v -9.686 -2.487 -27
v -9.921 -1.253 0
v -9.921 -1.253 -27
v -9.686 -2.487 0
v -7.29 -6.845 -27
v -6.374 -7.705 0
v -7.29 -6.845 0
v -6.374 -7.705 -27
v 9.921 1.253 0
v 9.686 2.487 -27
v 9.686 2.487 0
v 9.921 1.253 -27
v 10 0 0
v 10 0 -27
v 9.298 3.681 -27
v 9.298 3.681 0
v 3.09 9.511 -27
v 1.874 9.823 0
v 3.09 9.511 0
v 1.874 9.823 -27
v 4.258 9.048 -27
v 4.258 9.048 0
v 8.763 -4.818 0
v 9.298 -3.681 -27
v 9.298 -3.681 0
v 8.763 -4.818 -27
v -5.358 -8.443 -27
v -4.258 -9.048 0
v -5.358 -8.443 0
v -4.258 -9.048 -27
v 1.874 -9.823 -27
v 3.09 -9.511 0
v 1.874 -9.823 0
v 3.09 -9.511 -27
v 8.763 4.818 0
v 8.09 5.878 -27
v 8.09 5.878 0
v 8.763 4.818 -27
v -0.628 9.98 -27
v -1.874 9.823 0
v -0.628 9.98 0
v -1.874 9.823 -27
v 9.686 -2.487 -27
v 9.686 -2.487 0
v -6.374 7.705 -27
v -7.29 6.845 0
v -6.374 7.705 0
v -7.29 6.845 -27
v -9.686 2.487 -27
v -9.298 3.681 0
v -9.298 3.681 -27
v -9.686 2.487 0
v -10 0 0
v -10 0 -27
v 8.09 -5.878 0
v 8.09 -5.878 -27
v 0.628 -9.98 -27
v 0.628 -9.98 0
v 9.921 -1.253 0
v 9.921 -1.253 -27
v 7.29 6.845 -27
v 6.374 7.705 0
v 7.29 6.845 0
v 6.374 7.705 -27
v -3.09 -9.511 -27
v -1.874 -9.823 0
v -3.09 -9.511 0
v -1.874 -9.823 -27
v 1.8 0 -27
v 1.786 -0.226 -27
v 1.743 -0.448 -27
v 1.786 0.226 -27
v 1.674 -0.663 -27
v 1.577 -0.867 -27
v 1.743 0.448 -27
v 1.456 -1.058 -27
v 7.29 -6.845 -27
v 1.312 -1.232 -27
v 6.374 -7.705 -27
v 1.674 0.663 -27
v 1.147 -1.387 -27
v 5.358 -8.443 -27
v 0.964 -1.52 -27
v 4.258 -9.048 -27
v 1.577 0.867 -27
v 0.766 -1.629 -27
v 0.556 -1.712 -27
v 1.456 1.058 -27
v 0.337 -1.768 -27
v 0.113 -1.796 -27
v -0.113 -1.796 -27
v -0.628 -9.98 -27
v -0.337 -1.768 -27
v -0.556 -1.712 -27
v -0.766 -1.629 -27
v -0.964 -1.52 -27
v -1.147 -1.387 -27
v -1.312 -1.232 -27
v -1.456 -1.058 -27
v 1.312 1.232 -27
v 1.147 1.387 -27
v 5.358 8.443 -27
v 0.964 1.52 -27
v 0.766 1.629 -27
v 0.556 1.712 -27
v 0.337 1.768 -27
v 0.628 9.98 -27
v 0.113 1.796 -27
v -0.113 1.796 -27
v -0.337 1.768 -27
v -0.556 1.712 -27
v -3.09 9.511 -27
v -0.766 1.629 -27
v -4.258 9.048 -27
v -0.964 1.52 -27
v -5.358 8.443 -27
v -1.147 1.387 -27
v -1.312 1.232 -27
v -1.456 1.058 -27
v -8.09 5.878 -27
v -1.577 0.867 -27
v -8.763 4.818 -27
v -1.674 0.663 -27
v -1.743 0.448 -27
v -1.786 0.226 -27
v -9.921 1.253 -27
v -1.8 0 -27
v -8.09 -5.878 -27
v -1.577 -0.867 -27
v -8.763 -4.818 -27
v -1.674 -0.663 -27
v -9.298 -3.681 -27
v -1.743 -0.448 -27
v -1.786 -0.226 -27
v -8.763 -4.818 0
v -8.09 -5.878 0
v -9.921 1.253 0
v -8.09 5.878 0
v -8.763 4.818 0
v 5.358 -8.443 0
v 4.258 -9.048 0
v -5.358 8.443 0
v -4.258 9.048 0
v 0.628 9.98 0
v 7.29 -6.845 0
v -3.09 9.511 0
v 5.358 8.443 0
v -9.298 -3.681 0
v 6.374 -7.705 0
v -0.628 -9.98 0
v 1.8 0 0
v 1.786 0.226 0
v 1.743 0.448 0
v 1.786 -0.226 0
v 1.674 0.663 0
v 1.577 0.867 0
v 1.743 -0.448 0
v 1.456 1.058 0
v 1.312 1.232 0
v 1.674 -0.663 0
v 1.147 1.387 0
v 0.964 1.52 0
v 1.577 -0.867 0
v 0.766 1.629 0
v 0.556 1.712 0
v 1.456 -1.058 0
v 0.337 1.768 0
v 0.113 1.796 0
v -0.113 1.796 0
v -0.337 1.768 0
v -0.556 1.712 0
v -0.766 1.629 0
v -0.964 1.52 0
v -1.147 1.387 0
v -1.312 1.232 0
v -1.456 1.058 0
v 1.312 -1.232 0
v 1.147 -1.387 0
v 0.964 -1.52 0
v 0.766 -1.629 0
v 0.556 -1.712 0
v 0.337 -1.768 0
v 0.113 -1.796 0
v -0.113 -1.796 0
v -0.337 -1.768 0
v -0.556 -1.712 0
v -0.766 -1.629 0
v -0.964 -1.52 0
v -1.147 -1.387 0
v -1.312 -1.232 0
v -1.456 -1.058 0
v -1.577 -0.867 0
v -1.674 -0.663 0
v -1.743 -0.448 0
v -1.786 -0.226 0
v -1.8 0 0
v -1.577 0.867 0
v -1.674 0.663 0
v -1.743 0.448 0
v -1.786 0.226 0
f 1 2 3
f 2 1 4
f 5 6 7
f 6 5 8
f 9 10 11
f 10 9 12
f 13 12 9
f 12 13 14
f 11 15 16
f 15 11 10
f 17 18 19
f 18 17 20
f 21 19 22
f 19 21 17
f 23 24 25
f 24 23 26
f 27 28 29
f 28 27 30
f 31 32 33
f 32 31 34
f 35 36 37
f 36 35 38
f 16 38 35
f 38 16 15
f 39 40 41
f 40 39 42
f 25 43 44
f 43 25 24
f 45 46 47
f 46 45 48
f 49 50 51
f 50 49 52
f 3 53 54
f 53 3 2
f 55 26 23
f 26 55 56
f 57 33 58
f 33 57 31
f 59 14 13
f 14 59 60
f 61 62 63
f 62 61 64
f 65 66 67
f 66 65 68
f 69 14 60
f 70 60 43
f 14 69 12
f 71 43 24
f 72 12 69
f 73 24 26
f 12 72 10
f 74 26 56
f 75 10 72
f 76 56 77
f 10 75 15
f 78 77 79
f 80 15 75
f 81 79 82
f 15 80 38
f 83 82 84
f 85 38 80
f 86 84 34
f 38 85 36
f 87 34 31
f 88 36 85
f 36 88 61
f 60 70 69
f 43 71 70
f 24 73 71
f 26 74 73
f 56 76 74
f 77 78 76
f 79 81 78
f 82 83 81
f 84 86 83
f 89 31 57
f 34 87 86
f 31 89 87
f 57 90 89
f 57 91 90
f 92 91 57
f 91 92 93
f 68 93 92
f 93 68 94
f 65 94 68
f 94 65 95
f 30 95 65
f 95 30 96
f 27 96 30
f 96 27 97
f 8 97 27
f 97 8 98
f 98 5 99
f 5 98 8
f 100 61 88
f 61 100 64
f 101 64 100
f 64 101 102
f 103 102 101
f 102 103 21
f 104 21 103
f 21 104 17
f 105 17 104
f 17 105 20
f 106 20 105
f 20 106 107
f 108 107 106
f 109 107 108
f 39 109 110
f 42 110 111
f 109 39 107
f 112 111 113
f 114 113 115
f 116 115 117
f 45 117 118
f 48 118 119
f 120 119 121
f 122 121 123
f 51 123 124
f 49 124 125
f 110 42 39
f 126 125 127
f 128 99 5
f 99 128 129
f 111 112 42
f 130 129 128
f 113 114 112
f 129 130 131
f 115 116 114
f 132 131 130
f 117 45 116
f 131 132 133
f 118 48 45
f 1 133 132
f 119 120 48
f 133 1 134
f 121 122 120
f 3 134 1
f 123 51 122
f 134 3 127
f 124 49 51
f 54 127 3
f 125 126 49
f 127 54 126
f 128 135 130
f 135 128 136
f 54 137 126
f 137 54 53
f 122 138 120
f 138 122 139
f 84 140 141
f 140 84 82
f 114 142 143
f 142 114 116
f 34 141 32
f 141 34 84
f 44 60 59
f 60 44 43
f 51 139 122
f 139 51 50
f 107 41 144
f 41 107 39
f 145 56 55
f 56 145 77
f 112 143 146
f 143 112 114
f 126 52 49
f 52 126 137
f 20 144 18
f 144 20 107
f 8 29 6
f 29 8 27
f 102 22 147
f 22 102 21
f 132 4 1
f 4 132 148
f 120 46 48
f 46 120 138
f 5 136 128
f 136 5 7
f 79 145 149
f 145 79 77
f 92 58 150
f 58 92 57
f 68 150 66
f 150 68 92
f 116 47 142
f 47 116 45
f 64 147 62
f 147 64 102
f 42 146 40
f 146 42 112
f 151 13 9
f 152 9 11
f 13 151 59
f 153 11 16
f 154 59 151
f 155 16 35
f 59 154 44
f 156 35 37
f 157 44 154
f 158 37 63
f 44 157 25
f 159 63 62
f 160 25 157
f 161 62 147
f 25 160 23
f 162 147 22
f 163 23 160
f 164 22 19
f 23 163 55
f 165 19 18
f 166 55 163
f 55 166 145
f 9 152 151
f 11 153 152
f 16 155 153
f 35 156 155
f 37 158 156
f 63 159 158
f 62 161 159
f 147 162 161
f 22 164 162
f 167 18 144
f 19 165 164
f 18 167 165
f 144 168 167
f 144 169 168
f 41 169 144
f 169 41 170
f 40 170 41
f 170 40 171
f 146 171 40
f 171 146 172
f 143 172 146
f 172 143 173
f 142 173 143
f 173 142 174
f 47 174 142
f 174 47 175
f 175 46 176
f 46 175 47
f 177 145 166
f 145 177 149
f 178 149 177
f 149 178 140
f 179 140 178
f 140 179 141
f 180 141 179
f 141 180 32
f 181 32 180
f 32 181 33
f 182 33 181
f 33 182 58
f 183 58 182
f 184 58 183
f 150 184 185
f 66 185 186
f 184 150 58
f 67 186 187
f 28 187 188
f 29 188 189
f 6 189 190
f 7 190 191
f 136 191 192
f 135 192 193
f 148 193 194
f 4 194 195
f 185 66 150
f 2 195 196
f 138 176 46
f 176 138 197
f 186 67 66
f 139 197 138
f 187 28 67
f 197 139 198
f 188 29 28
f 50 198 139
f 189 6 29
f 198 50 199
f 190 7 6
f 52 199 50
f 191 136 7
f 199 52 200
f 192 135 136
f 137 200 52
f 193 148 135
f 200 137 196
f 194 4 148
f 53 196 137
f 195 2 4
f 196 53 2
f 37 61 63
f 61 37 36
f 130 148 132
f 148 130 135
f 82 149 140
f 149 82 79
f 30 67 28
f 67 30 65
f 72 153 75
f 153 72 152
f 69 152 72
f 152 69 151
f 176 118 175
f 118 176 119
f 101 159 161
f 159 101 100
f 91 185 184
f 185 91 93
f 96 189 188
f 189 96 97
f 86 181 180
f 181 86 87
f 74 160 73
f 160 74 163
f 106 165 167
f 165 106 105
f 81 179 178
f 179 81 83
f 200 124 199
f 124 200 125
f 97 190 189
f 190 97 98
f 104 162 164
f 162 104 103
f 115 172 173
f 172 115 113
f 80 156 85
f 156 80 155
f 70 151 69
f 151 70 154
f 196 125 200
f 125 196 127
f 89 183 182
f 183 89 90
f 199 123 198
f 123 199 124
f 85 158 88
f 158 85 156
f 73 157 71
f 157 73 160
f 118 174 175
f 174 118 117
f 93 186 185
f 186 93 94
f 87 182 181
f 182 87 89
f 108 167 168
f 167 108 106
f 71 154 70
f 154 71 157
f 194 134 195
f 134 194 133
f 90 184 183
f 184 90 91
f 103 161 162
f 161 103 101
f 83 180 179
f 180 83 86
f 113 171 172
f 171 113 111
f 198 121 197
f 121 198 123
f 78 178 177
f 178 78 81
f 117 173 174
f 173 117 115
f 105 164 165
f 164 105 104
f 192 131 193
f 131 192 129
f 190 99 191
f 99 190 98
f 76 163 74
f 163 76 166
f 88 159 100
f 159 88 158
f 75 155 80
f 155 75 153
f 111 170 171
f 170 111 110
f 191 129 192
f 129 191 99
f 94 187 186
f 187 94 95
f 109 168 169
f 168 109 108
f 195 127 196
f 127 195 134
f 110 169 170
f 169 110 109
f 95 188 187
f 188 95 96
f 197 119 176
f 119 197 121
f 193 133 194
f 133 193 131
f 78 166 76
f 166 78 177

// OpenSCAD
$fn = 50;


difference() {
	union() {
		translate(v = [0, 0, -27.0000000000]) {
			cylinder(h = 27, r = 10.0000000000);
		}
		cylinder(h = 0, r = 16.0000000000);
	}
	union() {
		#translate(v = [0, 0, -27]) {
			cylinder(h = 27, r = 1.8000000000);
		}
	}
}
